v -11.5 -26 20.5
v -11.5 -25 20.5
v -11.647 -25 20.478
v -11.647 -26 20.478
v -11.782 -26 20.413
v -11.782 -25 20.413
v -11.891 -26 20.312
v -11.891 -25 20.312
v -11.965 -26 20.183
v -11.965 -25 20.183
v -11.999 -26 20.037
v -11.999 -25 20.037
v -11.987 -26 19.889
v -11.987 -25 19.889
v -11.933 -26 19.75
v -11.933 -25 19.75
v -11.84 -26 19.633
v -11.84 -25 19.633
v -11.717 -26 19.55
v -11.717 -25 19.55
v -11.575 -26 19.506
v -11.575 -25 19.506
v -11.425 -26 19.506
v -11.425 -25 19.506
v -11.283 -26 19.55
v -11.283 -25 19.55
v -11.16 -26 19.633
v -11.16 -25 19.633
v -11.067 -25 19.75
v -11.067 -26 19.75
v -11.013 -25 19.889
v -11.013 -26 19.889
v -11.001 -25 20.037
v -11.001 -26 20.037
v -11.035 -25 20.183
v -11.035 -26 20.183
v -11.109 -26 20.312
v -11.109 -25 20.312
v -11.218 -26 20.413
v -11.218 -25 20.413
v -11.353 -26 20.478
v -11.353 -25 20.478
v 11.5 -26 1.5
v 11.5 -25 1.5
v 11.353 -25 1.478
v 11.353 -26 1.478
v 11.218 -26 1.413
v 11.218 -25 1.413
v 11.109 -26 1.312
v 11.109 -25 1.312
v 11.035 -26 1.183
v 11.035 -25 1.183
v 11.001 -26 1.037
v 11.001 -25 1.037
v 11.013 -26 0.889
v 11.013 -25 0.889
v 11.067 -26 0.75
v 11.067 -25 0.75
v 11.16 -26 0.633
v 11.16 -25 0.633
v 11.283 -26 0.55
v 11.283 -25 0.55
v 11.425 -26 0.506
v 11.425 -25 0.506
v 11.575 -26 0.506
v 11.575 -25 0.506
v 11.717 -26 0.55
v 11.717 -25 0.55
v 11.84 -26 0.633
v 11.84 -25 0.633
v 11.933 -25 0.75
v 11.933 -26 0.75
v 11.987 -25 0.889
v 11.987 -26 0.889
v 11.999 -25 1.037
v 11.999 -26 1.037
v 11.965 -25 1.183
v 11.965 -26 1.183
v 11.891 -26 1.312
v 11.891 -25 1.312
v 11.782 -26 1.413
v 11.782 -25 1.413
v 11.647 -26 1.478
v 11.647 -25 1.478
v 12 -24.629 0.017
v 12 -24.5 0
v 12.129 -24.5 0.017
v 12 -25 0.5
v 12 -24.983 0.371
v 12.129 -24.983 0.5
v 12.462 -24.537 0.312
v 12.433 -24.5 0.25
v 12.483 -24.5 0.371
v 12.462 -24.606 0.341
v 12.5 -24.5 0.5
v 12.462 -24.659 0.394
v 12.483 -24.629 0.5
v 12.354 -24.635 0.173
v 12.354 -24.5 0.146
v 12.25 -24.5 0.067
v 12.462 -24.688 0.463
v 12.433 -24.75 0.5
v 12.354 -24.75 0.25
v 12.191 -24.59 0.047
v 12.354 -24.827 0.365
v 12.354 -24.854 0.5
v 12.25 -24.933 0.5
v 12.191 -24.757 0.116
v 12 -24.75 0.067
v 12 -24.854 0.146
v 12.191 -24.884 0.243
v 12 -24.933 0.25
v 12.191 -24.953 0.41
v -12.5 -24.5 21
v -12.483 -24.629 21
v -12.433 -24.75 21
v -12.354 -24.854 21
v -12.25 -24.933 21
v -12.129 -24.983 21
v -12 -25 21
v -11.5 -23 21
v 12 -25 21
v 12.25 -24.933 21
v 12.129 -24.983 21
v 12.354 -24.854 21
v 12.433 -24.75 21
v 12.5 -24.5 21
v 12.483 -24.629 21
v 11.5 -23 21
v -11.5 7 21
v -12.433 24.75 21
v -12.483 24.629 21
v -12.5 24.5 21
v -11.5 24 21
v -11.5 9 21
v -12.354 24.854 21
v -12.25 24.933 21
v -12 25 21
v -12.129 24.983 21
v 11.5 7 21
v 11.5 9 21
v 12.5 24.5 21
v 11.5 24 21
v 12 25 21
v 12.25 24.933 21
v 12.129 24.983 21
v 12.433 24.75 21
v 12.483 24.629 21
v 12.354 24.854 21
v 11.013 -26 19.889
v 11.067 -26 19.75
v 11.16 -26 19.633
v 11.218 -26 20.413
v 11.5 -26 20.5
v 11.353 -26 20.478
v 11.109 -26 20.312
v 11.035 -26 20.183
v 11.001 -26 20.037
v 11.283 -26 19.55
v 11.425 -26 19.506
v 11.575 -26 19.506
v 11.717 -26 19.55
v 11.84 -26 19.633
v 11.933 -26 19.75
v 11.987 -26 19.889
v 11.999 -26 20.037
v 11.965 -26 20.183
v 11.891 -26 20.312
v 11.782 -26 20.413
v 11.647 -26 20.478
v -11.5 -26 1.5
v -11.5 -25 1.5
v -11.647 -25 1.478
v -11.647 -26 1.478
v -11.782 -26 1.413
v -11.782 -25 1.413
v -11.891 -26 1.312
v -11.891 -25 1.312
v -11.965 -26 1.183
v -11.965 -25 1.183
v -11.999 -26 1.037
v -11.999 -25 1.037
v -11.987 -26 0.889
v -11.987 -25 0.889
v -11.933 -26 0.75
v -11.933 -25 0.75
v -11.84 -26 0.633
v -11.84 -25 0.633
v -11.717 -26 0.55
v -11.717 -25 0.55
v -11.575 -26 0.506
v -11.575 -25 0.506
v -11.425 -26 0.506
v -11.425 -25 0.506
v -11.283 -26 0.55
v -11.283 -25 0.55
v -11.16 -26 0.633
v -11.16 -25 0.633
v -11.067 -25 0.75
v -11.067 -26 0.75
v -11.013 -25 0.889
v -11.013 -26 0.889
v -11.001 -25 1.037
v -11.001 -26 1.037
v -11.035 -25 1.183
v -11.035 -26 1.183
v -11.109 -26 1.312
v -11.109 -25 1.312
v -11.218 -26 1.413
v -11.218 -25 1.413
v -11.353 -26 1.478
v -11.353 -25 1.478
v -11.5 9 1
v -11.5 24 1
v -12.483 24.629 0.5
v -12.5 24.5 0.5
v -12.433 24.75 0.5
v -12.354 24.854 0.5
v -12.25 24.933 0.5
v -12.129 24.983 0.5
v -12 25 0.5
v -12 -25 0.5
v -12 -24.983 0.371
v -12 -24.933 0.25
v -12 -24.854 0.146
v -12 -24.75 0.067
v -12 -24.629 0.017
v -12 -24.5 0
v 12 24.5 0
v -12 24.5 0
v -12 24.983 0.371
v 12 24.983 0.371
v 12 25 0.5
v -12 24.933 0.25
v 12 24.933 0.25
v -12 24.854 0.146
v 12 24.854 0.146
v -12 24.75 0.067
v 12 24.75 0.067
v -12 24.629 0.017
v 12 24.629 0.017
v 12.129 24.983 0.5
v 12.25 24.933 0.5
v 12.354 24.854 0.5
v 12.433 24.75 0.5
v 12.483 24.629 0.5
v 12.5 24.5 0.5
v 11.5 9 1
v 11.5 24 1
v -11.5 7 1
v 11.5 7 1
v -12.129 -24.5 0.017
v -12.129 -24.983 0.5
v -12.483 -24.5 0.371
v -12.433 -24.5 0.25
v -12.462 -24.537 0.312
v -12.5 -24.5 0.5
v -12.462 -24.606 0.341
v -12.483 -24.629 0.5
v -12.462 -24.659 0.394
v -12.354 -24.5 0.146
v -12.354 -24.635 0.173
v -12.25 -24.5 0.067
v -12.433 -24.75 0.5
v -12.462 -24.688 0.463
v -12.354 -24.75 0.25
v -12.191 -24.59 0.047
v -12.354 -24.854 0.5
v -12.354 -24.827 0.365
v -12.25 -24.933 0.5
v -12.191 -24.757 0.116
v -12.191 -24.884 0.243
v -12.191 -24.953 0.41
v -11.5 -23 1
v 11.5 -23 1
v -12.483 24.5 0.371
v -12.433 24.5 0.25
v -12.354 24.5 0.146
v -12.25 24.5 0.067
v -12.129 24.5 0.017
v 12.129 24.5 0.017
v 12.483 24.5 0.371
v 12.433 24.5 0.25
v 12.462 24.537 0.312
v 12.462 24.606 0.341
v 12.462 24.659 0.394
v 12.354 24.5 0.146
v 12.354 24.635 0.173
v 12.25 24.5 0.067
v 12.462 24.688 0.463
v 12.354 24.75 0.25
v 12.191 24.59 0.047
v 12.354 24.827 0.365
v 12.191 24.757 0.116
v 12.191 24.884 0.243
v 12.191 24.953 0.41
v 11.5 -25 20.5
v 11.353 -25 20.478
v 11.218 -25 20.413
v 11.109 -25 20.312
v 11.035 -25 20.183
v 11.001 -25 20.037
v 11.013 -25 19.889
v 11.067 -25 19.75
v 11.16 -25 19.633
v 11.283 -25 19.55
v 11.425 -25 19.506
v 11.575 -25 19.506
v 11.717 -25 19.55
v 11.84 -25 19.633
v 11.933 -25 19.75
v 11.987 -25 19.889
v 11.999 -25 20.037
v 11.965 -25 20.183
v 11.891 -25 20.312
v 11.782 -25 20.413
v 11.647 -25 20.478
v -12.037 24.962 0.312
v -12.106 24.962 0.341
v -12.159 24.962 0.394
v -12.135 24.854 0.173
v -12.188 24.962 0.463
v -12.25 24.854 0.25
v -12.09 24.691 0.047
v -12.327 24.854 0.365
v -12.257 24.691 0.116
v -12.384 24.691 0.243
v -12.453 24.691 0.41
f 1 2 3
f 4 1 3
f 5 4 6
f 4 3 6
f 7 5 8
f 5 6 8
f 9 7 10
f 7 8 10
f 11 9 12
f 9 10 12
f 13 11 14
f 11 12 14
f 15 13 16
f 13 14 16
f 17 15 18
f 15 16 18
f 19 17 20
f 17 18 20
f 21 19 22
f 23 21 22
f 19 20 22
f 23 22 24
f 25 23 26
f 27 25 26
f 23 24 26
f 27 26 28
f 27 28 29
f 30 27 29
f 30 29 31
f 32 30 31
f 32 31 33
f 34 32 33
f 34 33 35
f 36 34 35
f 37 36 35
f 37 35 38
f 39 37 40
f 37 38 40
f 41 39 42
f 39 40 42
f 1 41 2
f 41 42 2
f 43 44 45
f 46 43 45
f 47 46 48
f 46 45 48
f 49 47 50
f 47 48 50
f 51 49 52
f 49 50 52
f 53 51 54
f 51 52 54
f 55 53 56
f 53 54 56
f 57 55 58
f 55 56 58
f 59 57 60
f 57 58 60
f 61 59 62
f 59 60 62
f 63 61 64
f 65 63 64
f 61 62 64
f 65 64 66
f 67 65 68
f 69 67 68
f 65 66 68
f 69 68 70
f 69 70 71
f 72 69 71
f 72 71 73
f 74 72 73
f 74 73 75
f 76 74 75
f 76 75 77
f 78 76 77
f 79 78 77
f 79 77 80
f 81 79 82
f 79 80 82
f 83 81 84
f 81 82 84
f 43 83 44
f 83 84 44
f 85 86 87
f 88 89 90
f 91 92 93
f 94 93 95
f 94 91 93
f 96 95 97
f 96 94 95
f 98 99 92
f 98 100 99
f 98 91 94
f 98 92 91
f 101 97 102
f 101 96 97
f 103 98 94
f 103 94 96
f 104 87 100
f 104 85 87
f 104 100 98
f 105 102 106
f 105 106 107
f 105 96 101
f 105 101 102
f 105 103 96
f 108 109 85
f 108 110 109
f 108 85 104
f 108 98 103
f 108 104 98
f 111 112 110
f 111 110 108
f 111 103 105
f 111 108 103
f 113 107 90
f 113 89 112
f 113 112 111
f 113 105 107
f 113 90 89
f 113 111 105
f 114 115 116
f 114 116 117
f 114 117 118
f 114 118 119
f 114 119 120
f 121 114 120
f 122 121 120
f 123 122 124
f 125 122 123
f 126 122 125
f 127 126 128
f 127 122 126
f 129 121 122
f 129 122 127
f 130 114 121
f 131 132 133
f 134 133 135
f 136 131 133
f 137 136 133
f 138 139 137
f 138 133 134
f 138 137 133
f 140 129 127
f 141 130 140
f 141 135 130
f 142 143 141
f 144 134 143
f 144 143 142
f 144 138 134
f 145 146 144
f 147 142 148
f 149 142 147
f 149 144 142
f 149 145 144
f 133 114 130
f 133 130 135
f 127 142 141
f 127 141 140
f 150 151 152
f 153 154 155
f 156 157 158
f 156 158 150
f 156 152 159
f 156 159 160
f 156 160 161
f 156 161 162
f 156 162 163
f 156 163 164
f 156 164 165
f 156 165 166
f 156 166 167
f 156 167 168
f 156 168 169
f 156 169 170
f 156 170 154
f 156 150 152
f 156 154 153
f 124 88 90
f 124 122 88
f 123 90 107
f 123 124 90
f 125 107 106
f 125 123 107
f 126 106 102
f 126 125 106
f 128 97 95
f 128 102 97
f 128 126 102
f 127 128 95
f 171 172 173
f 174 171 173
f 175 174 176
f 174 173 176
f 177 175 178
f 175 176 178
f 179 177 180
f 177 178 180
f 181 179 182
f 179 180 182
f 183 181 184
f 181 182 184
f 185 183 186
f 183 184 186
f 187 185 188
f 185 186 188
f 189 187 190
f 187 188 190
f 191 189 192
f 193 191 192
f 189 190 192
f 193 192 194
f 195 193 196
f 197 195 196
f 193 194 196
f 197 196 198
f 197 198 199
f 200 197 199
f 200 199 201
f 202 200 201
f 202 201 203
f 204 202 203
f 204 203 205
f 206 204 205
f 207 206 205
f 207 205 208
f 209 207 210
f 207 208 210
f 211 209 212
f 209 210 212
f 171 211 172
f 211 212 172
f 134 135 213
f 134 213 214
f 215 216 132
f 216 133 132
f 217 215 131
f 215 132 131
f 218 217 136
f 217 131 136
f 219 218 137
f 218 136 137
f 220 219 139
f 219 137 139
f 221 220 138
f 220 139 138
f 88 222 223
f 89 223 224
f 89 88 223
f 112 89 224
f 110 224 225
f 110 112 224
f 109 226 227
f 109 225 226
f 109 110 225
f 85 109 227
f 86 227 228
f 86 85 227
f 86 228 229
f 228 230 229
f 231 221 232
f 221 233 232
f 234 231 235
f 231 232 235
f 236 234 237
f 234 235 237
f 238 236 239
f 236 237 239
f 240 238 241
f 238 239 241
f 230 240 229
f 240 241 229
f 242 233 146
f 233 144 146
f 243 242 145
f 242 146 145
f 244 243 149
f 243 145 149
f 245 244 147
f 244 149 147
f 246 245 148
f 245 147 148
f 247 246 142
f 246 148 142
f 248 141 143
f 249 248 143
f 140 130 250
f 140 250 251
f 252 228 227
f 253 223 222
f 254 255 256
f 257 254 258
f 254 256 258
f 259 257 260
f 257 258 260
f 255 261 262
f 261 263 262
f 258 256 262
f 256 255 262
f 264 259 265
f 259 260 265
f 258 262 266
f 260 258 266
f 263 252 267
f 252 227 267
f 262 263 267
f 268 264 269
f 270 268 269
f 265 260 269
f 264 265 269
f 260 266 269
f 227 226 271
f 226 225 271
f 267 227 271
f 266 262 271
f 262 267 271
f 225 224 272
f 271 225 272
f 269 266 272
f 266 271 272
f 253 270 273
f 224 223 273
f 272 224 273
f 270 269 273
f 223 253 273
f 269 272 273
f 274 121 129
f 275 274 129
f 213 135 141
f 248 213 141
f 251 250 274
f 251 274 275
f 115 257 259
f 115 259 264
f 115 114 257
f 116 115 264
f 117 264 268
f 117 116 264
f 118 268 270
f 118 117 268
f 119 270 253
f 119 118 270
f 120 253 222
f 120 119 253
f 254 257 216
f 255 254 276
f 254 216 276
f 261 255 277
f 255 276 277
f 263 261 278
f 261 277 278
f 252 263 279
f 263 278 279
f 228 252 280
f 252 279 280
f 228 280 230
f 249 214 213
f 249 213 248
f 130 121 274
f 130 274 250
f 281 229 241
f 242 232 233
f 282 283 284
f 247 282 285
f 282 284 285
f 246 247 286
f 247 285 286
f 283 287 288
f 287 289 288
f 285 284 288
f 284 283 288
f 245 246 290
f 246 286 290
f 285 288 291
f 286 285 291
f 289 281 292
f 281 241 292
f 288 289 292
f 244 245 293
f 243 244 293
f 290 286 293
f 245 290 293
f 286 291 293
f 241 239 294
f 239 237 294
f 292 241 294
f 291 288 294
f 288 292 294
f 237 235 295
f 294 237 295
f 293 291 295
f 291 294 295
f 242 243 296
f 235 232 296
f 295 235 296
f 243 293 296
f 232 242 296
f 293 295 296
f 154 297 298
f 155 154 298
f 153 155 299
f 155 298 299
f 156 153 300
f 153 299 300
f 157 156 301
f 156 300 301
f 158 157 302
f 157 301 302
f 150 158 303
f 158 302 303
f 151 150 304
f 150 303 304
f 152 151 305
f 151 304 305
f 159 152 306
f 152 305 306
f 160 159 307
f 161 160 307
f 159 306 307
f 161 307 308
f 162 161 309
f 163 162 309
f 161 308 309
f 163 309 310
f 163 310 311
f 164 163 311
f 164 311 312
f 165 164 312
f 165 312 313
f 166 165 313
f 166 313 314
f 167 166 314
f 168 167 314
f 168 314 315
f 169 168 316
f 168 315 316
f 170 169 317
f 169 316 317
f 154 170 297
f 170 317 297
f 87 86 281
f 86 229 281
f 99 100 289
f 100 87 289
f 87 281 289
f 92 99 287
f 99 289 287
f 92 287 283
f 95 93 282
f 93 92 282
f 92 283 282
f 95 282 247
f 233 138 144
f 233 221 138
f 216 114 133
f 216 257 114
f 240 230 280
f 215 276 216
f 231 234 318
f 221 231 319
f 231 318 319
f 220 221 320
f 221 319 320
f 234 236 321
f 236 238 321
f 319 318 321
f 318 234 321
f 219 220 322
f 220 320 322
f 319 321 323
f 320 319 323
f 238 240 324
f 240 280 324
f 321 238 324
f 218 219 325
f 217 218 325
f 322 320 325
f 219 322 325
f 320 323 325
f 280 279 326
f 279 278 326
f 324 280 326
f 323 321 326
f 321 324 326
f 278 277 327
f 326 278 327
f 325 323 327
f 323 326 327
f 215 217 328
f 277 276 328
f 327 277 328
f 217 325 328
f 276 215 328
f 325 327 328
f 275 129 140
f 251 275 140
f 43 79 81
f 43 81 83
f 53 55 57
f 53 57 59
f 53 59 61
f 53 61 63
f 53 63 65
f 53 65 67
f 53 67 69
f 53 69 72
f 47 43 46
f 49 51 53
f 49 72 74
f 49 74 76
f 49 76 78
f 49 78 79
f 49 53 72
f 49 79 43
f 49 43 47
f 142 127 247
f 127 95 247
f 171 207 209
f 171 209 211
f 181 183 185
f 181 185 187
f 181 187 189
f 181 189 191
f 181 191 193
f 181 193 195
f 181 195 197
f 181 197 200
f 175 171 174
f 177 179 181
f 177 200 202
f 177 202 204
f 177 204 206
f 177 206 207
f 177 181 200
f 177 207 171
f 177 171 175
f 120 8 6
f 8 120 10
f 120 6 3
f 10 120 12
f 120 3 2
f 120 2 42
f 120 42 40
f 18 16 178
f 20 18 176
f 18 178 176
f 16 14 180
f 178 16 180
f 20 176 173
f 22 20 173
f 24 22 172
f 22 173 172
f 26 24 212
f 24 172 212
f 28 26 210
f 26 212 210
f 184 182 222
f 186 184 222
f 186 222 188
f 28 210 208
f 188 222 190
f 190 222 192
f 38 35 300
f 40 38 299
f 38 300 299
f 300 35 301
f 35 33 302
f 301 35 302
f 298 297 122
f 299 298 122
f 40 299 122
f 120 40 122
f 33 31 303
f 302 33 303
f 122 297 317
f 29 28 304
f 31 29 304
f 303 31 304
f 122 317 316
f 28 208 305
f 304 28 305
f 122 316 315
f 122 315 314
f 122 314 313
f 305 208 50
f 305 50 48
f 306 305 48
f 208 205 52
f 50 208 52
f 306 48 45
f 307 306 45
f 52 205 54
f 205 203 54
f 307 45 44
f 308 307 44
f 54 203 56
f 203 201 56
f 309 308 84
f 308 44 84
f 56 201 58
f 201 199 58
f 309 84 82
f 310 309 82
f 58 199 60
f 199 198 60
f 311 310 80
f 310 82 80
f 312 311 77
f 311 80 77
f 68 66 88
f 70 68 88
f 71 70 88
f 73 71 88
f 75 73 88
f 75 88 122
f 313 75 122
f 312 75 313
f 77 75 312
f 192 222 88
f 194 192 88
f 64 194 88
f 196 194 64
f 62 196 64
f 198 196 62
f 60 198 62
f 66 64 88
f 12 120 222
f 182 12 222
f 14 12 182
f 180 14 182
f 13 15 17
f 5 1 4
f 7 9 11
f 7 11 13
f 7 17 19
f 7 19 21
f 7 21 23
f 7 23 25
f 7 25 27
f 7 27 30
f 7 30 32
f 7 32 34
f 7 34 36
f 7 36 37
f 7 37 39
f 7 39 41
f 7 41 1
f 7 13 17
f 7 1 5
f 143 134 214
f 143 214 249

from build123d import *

# Parameters (mm, degrees)
SKETCH_1_W          = 25
SKETCH_1_H          = 50
EXTRUDE_1_DEPTH     = 21
SKETCH_2_W          = 23
SKETCH_2_H          = 15
SKETCH_2_H_2        = 30
CUT_EXTRUDE_1_DEPTH = 20
SKETCH_3_R          = 0.5
EXTRUDE_2_DEPTH     = 1
FILLET_1_R          = 0.5


with BuildPart() as part:
    # 草圖1 → 填料-伸長1 (new body)
    with BuildSketch(Plane.XY):
        Rectangle(SKETCH_1_W, SKETCH_1_H)
    extrude(amount=EXTRUDE_1_DEPTH)

    # 草圖2 → 除料-伸長1 (cut)
    with BuildSketch(Plane.XY.offset(21)):
        with Locations((0, 16.5)):
            Rectangle(SKETCH_2_W, SKETCH_2_H)
        with Locations((0, -8)):
            Rectangle(SKETCH_2_W, SKETCH_2_H_2)
    extrude(amount=-CUT_EXTRUDE_1_DEPTH, mode=Mode.SUBTRACT)

    # 草圖3 → 填料-伸長2 (add)
    with BuildSketch(Plane.XZ.offset(25)):
        with Locations(Location((-11.5, 20, 0), (0, 0, 90))):
            Circle(SKETCH_3_R)
        with Locations(Location((11.5, 20, 0), (0, 0, 90))):
            Circle(SKETCH_3_R)
        with Locations(Location((11.5, 1, 0), (0, 0, 90))):
            Circle(SKETCH_3_R)
        with Locations(Location((-11.5, 1, 0), (0, 0, 90))):
            Circle(SKETCH_3_R)
    extrude(amount=EXTRUDE_2_DEPTH)

    # 圓角1
    fillet_1_edges = [part.edges().sort_by_distance(p)[0] for p in [
        (0, -25, 0),
        (-12.5, 0, 0),
        (0, 25, 0),
        (12.5, 0, 0),
        (12.5, -25, 10.5),
        (-12.5, -25, 10.5),
        (-12.5, 25, 10.5),
        (12.5, 25, 10.5),
    ]]
    fillet(fillet_1_edges, radius=FILLET_1_R - 0.0001)  # a hair under: the kernel refuses the full size


solid = part.part
